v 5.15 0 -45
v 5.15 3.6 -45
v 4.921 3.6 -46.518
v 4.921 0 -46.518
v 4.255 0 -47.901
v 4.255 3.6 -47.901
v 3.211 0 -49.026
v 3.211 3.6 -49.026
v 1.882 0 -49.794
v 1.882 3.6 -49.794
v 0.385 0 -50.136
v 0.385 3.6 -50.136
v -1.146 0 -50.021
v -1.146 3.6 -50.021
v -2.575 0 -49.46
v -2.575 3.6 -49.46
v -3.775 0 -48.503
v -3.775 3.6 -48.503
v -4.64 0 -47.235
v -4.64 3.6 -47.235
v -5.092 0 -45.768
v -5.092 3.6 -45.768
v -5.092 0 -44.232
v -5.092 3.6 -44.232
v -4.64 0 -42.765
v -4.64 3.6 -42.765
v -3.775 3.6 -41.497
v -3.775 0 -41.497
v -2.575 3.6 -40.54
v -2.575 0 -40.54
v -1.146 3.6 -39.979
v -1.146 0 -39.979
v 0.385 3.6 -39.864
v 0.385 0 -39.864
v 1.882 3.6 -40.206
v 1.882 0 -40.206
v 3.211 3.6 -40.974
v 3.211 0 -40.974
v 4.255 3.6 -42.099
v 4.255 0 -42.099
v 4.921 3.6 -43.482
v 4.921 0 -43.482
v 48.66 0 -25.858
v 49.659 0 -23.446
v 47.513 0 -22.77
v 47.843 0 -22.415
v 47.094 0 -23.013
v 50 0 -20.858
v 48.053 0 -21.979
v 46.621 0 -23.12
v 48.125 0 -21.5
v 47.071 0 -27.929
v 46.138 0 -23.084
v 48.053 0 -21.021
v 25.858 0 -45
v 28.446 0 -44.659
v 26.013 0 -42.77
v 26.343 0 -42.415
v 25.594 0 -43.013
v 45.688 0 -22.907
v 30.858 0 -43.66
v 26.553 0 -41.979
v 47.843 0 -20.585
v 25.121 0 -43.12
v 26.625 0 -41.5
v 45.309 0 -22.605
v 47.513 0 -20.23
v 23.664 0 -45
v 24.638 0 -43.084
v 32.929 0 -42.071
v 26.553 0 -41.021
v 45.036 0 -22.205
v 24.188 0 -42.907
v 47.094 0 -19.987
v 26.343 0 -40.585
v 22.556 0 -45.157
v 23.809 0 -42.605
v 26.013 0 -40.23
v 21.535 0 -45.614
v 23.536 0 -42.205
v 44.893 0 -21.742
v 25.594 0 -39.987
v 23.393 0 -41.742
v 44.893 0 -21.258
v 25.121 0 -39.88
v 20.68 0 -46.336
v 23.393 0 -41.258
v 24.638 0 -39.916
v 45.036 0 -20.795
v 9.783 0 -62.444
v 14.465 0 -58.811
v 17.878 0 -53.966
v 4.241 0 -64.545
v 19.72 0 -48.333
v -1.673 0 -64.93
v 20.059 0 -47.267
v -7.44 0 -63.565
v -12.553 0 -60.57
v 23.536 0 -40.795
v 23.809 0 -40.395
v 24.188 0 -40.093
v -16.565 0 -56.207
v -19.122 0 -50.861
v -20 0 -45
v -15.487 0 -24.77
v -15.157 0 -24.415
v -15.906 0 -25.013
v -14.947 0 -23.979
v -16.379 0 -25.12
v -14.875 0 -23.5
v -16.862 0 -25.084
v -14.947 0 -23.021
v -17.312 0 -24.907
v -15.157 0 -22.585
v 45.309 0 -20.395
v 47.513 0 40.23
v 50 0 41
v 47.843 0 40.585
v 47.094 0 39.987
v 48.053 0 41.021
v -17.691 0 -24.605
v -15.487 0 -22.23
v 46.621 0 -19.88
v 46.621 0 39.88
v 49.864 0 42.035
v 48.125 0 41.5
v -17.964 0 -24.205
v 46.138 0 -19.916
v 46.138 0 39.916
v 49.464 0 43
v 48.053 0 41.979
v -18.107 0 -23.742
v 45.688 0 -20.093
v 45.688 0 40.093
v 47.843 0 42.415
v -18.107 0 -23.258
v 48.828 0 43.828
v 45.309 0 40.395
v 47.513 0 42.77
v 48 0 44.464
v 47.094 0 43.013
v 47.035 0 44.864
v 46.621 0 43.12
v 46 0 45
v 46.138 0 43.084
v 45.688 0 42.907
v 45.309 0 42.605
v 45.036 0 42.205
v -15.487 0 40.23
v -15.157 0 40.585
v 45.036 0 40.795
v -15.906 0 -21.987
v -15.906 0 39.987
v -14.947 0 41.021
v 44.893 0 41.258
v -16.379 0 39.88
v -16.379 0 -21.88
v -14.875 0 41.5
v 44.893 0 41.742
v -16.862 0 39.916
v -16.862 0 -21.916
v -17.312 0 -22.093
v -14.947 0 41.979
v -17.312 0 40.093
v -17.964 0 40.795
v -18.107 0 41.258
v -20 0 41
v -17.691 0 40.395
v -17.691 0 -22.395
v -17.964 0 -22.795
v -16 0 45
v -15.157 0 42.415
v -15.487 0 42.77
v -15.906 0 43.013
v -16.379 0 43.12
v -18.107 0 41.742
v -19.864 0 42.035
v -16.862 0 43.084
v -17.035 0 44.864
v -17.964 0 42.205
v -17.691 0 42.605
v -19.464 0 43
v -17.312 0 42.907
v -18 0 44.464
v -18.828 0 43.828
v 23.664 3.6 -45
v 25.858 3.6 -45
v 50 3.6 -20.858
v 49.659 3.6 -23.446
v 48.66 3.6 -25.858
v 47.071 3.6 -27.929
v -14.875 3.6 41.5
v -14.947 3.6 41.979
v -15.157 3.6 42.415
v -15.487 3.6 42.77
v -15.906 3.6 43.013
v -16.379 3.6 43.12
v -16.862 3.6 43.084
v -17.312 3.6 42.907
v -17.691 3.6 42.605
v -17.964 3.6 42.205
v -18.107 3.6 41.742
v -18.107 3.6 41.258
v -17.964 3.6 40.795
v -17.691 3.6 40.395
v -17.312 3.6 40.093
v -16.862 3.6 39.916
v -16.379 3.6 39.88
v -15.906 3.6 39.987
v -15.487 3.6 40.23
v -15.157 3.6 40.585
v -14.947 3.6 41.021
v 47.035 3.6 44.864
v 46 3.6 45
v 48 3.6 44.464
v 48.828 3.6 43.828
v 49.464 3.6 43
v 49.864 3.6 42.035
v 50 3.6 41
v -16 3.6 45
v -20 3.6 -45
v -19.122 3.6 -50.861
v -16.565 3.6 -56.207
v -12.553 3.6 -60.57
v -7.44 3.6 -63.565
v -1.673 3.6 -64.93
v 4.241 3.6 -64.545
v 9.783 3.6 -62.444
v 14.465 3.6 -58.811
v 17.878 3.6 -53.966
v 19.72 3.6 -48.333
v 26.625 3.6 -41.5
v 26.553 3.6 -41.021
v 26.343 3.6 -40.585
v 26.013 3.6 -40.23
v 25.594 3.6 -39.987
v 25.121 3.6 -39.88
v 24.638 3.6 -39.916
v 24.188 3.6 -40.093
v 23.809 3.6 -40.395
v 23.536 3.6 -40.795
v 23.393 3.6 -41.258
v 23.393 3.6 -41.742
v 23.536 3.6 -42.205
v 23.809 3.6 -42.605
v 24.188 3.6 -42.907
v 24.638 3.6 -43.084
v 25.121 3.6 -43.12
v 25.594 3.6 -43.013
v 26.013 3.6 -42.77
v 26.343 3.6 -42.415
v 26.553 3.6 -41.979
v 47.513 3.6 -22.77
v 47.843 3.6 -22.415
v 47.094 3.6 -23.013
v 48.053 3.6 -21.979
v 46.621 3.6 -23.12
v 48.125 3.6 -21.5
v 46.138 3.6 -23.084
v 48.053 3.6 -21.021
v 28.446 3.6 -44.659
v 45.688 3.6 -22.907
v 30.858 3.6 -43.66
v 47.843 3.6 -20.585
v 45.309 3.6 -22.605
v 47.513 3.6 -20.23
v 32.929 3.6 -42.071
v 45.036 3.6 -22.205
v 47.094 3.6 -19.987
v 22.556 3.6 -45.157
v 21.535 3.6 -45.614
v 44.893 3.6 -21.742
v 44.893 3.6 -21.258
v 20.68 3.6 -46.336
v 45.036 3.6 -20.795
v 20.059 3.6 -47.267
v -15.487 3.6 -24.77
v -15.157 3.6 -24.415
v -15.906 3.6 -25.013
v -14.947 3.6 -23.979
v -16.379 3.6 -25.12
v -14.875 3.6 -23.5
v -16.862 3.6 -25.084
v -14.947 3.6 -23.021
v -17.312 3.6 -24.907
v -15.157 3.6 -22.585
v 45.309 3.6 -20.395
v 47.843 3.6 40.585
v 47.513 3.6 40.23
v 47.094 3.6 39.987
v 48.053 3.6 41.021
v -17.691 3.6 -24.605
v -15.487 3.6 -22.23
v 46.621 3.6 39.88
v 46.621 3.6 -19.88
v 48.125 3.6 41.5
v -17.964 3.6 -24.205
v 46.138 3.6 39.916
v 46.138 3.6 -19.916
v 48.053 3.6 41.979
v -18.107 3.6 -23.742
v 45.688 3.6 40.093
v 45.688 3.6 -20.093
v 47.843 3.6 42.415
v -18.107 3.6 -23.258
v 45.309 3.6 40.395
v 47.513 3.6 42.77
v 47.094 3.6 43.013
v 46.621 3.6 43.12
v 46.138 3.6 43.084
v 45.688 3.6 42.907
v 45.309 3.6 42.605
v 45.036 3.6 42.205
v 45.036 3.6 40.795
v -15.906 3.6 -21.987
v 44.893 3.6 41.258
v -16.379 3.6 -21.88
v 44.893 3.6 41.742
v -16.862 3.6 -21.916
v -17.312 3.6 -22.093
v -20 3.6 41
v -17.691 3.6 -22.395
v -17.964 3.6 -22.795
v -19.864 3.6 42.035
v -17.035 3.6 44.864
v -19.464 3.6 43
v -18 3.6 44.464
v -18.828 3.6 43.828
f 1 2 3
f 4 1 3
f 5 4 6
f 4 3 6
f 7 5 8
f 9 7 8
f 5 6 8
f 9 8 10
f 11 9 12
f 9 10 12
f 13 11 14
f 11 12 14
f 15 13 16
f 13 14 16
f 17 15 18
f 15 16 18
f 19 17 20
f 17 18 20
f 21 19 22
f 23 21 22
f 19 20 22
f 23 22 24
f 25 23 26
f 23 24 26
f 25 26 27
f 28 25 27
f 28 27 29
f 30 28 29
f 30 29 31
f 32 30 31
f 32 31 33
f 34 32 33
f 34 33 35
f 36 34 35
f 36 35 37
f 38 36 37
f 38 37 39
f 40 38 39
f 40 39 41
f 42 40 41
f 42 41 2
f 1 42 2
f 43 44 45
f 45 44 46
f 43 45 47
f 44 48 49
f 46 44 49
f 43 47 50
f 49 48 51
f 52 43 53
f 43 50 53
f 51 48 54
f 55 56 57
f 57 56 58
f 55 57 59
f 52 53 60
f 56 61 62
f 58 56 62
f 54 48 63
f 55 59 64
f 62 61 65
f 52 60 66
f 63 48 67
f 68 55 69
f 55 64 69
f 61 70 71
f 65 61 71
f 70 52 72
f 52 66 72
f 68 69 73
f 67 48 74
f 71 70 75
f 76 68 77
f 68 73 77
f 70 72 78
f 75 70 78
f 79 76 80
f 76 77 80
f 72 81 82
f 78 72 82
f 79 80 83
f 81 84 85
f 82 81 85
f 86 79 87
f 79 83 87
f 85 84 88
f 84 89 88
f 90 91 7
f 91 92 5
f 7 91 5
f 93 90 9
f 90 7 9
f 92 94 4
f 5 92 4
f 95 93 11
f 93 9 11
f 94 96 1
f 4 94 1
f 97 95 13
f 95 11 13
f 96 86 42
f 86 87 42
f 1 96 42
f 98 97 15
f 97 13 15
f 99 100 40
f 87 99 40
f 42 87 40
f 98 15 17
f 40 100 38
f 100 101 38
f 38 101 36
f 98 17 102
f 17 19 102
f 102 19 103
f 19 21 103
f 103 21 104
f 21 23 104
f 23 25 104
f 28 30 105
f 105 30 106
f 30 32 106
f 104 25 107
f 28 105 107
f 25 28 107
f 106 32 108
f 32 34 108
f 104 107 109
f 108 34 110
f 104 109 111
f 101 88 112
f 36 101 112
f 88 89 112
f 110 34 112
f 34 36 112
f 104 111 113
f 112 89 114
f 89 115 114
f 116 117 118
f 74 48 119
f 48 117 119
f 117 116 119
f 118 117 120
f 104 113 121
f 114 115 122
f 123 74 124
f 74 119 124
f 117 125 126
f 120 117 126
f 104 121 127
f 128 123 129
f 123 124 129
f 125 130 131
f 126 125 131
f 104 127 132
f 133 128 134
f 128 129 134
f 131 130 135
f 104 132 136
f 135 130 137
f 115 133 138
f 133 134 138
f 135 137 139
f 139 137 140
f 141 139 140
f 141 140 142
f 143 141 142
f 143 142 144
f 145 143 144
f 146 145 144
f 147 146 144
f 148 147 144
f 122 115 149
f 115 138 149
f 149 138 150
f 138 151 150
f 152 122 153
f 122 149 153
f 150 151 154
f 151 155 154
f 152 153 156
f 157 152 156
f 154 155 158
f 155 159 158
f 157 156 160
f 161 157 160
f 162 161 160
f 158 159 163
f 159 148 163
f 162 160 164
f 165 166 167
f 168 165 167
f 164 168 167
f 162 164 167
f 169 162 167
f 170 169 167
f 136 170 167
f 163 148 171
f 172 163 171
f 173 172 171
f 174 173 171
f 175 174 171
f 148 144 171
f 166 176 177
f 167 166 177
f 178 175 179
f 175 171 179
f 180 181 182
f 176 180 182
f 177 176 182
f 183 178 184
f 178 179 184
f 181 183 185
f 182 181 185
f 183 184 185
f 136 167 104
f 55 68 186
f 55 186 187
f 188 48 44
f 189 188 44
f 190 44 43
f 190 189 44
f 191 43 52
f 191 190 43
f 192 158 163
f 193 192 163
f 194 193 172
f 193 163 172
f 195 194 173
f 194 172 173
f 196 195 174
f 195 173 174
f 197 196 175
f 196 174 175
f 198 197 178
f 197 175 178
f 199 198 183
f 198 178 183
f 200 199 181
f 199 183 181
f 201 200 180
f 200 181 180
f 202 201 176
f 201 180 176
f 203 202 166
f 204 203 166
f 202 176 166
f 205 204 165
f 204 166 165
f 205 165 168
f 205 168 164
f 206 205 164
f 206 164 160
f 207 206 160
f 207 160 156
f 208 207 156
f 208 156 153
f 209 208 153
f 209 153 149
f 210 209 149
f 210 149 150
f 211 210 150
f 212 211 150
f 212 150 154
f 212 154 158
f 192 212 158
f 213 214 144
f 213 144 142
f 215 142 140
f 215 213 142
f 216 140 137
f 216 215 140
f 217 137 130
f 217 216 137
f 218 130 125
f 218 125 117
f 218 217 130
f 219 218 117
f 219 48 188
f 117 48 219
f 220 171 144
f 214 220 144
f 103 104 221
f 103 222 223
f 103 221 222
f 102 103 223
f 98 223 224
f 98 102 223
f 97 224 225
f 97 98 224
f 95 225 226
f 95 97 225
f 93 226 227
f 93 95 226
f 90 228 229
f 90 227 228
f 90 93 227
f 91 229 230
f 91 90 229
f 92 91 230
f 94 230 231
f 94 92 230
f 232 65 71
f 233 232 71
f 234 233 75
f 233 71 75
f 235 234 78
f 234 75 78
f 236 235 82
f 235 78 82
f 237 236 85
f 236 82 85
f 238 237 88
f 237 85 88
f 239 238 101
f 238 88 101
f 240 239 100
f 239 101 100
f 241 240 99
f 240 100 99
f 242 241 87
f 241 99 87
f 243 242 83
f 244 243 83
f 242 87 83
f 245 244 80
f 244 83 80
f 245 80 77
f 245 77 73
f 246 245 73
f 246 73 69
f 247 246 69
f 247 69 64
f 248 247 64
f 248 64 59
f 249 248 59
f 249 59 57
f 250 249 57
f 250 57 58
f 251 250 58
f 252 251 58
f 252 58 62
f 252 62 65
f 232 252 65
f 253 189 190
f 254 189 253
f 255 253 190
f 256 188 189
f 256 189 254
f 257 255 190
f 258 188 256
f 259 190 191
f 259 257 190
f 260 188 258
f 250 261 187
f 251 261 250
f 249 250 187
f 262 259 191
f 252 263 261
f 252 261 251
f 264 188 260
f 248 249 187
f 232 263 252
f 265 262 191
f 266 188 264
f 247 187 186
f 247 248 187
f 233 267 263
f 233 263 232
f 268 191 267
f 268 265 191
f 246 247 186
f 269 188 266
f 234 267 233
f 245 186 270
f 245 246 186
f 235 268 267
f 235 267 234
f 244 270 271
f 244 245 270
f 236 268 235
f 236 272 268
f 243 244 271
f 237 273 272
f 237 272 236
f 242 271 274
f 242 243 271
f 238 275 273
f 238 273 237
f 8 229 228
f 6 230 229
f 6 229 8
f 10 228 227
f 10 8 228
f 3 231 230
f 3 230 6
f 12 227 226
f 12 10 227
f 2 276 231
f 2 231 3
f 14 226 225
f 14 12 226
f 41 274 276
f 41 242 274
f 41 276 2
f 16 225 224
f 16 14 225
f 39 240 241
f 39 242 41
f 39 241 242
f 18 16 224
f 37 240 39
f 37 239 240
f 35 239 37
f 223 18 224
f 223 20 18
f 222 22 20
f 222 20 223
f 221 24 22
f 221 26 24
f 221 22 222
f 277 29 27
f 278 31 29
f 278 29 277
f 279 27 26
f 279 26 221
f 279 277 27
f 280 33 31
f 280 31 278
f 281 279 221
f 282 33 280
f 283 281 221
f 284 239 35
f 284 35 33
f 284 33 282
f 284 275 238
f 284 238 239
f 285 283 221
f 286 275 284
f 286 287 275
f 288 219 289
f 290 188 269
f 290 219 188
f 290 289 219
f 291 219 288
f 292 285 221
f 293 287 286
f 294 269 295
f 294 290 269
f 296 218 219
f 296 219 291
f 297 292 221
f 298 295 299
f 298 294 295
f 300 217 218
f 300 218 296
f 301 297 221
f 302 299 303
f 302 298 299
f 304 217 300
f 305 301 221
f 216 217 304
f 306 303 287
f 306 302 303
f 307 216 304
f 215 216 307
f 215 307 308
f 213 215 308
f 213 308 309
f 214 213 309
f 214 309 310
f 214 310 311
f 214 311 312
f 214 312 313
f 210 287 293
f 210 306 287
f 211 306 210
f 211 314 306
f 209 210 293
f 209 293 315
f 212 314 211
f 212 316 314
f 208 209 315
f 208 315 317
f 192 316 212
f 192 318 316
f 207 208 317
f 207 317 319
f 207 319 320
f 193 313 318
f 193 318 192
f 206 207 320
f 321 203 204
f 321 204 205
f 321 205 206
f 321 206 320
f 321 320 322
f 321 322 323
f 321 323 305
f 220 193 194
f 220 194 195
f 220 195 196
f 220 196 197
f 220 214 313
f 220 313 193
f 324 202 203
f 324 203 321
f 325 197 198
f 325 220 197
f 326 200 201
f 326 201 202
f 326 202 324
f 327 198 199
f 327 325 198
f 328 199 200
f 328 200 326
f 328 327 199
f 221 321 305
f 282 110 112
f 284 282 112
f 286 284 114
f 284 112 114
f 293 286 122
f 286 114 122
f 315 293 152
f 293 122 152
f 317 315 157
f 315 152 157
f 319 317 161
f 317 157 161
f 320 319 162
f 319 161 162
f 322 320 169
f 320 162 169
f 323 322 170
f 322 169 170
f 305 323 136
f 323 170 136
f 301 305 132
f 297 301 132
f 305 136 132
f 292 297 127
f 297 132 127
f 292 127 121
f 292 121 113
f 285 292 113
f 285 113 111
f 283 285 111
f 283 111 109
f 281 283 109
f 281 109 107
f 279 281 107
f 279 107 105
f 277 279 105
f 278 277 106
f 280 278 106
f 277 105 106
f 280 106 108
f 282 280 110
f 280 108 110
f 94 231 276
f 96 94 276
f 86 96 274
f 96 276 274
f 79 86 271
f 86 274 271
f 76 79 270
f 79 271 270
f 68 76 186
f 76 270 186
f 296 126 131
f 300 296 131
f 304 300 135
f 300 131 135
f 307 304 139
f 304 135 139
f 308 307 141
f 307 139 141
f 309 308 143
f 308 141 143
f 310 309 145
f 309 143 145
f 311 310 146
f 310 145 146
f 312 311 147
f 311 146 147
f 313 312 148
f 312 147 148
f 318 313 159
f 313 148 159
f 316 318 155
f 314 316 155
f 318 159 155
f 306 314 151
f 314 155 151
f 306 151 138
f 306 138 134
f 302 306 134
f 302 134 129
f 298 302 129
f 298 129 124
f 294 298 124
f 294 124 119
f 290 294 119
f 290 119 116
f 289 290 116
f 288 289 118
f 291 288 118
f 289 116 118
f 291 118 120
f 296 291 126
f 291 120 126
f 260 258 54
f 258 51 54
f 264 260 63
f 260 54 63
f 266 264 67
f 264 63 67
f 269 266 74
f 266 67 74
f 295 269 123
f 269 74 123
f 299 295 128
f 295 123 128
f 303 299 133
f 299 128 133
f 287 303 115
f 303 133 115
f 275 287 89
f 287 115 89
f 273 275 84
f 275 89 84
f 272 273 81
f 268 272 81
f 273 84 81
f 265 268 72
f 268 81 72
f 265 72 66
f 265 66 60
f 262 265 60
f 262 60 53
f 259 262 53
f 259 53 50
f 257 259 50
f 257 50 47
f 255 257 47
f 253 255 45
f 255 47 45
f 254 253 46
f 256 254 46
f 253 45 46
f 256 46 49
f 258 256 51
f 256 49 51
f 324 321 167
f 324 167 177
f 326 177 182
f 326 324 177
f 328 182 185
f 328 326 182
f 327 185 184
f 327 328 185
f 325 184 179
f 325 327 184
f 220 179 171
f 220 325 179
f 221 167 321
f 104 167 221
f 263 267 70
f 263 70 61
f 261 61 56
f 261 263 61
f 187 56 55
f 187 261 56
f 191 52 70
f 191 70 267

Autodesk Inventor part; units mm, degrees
ref_plane "YZ Plane" through (0, 0, 0) normal (1, 0, 0) x (0, 1, 0)
ref_plane "XZ Plane" through (0, 0, 0) normal (0, 1, 0) x (-1, 0, 0)
ref_plane "XY Plane" through (0, 0, 0) normal (0, 0, 1) x (1, 0, 0)
sketch "Sketch1" plane through (0, 0, 0) normal (0, 1, 0) x (-1, 0, 0)
  line L0 (20, 45) -> (-20, 45)
  line L1 (-20, 45) -> (-20, -45)
  line L2 (-20, -45) -> (20, -45)
  line L3 (20, 45) -> (-20, -45) construction
  line L4 (-20, 45) -> (20, -45) construction
  arc A0 (-20, -45) -> (20, -45) centre (0, -45) ccw
  line L5 (20, 45) -> (20, -45)
  line L6 (-20, -45) -> (-50, -45)
  line L7 (-50, -45) -> (-50, 45)
  line L8 (-50, 45) -> (-20, 45)
  line L9 (-20, 45) -> (-20, -45)
  point P0 (0, 0)
  dimension "d0" = 40
  dimension "d1" = 90
  dimension "d26" = 30
extrude "Extrusion1" add sketch "Sketch1" along normal blind 3.6
sketch "Sketch2" plane through (0, 3.6, 0) normal (0, 1, 0) x (1, 0, 0)
  arc A0 (20, 45) -> (-20, 45) centre (0, 45) ccw projected
  circle A1 centre (0, 45) radius 5.15
  point P0 (0, 0)
  dimension "d4" = 10.3
extrude "Extrusion2" cut sketch "Sketch2" against normal blind 3.6
fillet "Fillet1" radius 4 4 edges at (-20, 1.8, -45) (50, 1.8, 45) (-20, 1.8, 45) (20, 1.8, -45)
chamfer "Chamfer1" distance 20 angle 45 1 edges at (50, 1.8, -45)
fillet "Fillet2" radius 10 2 edges at (30, 1.8, -45) (50, 1.8, -25)
sketch "Sketch5" plane through (0, 0, 0) normal (0, -1, 0) x (1, 0, 0)
  circle A0 centre (25, -41.5) radius 1.625
  circle A1 centre (46.5, -21.5) radius 1.625
  circle A2 centre (46.5, 41.5) radius 1.625
  circle A3 centre (-16.5, -23.5) radius 1.625
  line L0 (25.8579, -45) -> (23.6643, -45) projected
  line L1 (50, 41) -> (50, -20.8579) projected
  line L2 (-20, -45) -> (-20, 41) projected
  line L3 (-16, 45) -> (46, 45) projected
  circle A4 centre (-16.5, 41.5) radius 1.625
  point P0 (0, 0)
  dimension "d31" = 3.25
  dimension "d32" = 3.25
  dimension "d34" = 3.25
  dimension "d35" = 3.25
  dimension "d36" = 3.5
  dimension "d37" = 3.5
  dimension "d38" = 3.5
  dimension "d40" = 25
  dimension "d41" = 20
  dimension "d42" = 3.5
  dimension "d43" = 3.5
  dimension "d48" = 3.25
  dimension "d49" = 3.5
  dimension "d50" = 3.5
  dimension "d52" = 65
extrude "Extrusion5" cut sketch "Sketch5" against normal blind 10
properties part number "p1"
